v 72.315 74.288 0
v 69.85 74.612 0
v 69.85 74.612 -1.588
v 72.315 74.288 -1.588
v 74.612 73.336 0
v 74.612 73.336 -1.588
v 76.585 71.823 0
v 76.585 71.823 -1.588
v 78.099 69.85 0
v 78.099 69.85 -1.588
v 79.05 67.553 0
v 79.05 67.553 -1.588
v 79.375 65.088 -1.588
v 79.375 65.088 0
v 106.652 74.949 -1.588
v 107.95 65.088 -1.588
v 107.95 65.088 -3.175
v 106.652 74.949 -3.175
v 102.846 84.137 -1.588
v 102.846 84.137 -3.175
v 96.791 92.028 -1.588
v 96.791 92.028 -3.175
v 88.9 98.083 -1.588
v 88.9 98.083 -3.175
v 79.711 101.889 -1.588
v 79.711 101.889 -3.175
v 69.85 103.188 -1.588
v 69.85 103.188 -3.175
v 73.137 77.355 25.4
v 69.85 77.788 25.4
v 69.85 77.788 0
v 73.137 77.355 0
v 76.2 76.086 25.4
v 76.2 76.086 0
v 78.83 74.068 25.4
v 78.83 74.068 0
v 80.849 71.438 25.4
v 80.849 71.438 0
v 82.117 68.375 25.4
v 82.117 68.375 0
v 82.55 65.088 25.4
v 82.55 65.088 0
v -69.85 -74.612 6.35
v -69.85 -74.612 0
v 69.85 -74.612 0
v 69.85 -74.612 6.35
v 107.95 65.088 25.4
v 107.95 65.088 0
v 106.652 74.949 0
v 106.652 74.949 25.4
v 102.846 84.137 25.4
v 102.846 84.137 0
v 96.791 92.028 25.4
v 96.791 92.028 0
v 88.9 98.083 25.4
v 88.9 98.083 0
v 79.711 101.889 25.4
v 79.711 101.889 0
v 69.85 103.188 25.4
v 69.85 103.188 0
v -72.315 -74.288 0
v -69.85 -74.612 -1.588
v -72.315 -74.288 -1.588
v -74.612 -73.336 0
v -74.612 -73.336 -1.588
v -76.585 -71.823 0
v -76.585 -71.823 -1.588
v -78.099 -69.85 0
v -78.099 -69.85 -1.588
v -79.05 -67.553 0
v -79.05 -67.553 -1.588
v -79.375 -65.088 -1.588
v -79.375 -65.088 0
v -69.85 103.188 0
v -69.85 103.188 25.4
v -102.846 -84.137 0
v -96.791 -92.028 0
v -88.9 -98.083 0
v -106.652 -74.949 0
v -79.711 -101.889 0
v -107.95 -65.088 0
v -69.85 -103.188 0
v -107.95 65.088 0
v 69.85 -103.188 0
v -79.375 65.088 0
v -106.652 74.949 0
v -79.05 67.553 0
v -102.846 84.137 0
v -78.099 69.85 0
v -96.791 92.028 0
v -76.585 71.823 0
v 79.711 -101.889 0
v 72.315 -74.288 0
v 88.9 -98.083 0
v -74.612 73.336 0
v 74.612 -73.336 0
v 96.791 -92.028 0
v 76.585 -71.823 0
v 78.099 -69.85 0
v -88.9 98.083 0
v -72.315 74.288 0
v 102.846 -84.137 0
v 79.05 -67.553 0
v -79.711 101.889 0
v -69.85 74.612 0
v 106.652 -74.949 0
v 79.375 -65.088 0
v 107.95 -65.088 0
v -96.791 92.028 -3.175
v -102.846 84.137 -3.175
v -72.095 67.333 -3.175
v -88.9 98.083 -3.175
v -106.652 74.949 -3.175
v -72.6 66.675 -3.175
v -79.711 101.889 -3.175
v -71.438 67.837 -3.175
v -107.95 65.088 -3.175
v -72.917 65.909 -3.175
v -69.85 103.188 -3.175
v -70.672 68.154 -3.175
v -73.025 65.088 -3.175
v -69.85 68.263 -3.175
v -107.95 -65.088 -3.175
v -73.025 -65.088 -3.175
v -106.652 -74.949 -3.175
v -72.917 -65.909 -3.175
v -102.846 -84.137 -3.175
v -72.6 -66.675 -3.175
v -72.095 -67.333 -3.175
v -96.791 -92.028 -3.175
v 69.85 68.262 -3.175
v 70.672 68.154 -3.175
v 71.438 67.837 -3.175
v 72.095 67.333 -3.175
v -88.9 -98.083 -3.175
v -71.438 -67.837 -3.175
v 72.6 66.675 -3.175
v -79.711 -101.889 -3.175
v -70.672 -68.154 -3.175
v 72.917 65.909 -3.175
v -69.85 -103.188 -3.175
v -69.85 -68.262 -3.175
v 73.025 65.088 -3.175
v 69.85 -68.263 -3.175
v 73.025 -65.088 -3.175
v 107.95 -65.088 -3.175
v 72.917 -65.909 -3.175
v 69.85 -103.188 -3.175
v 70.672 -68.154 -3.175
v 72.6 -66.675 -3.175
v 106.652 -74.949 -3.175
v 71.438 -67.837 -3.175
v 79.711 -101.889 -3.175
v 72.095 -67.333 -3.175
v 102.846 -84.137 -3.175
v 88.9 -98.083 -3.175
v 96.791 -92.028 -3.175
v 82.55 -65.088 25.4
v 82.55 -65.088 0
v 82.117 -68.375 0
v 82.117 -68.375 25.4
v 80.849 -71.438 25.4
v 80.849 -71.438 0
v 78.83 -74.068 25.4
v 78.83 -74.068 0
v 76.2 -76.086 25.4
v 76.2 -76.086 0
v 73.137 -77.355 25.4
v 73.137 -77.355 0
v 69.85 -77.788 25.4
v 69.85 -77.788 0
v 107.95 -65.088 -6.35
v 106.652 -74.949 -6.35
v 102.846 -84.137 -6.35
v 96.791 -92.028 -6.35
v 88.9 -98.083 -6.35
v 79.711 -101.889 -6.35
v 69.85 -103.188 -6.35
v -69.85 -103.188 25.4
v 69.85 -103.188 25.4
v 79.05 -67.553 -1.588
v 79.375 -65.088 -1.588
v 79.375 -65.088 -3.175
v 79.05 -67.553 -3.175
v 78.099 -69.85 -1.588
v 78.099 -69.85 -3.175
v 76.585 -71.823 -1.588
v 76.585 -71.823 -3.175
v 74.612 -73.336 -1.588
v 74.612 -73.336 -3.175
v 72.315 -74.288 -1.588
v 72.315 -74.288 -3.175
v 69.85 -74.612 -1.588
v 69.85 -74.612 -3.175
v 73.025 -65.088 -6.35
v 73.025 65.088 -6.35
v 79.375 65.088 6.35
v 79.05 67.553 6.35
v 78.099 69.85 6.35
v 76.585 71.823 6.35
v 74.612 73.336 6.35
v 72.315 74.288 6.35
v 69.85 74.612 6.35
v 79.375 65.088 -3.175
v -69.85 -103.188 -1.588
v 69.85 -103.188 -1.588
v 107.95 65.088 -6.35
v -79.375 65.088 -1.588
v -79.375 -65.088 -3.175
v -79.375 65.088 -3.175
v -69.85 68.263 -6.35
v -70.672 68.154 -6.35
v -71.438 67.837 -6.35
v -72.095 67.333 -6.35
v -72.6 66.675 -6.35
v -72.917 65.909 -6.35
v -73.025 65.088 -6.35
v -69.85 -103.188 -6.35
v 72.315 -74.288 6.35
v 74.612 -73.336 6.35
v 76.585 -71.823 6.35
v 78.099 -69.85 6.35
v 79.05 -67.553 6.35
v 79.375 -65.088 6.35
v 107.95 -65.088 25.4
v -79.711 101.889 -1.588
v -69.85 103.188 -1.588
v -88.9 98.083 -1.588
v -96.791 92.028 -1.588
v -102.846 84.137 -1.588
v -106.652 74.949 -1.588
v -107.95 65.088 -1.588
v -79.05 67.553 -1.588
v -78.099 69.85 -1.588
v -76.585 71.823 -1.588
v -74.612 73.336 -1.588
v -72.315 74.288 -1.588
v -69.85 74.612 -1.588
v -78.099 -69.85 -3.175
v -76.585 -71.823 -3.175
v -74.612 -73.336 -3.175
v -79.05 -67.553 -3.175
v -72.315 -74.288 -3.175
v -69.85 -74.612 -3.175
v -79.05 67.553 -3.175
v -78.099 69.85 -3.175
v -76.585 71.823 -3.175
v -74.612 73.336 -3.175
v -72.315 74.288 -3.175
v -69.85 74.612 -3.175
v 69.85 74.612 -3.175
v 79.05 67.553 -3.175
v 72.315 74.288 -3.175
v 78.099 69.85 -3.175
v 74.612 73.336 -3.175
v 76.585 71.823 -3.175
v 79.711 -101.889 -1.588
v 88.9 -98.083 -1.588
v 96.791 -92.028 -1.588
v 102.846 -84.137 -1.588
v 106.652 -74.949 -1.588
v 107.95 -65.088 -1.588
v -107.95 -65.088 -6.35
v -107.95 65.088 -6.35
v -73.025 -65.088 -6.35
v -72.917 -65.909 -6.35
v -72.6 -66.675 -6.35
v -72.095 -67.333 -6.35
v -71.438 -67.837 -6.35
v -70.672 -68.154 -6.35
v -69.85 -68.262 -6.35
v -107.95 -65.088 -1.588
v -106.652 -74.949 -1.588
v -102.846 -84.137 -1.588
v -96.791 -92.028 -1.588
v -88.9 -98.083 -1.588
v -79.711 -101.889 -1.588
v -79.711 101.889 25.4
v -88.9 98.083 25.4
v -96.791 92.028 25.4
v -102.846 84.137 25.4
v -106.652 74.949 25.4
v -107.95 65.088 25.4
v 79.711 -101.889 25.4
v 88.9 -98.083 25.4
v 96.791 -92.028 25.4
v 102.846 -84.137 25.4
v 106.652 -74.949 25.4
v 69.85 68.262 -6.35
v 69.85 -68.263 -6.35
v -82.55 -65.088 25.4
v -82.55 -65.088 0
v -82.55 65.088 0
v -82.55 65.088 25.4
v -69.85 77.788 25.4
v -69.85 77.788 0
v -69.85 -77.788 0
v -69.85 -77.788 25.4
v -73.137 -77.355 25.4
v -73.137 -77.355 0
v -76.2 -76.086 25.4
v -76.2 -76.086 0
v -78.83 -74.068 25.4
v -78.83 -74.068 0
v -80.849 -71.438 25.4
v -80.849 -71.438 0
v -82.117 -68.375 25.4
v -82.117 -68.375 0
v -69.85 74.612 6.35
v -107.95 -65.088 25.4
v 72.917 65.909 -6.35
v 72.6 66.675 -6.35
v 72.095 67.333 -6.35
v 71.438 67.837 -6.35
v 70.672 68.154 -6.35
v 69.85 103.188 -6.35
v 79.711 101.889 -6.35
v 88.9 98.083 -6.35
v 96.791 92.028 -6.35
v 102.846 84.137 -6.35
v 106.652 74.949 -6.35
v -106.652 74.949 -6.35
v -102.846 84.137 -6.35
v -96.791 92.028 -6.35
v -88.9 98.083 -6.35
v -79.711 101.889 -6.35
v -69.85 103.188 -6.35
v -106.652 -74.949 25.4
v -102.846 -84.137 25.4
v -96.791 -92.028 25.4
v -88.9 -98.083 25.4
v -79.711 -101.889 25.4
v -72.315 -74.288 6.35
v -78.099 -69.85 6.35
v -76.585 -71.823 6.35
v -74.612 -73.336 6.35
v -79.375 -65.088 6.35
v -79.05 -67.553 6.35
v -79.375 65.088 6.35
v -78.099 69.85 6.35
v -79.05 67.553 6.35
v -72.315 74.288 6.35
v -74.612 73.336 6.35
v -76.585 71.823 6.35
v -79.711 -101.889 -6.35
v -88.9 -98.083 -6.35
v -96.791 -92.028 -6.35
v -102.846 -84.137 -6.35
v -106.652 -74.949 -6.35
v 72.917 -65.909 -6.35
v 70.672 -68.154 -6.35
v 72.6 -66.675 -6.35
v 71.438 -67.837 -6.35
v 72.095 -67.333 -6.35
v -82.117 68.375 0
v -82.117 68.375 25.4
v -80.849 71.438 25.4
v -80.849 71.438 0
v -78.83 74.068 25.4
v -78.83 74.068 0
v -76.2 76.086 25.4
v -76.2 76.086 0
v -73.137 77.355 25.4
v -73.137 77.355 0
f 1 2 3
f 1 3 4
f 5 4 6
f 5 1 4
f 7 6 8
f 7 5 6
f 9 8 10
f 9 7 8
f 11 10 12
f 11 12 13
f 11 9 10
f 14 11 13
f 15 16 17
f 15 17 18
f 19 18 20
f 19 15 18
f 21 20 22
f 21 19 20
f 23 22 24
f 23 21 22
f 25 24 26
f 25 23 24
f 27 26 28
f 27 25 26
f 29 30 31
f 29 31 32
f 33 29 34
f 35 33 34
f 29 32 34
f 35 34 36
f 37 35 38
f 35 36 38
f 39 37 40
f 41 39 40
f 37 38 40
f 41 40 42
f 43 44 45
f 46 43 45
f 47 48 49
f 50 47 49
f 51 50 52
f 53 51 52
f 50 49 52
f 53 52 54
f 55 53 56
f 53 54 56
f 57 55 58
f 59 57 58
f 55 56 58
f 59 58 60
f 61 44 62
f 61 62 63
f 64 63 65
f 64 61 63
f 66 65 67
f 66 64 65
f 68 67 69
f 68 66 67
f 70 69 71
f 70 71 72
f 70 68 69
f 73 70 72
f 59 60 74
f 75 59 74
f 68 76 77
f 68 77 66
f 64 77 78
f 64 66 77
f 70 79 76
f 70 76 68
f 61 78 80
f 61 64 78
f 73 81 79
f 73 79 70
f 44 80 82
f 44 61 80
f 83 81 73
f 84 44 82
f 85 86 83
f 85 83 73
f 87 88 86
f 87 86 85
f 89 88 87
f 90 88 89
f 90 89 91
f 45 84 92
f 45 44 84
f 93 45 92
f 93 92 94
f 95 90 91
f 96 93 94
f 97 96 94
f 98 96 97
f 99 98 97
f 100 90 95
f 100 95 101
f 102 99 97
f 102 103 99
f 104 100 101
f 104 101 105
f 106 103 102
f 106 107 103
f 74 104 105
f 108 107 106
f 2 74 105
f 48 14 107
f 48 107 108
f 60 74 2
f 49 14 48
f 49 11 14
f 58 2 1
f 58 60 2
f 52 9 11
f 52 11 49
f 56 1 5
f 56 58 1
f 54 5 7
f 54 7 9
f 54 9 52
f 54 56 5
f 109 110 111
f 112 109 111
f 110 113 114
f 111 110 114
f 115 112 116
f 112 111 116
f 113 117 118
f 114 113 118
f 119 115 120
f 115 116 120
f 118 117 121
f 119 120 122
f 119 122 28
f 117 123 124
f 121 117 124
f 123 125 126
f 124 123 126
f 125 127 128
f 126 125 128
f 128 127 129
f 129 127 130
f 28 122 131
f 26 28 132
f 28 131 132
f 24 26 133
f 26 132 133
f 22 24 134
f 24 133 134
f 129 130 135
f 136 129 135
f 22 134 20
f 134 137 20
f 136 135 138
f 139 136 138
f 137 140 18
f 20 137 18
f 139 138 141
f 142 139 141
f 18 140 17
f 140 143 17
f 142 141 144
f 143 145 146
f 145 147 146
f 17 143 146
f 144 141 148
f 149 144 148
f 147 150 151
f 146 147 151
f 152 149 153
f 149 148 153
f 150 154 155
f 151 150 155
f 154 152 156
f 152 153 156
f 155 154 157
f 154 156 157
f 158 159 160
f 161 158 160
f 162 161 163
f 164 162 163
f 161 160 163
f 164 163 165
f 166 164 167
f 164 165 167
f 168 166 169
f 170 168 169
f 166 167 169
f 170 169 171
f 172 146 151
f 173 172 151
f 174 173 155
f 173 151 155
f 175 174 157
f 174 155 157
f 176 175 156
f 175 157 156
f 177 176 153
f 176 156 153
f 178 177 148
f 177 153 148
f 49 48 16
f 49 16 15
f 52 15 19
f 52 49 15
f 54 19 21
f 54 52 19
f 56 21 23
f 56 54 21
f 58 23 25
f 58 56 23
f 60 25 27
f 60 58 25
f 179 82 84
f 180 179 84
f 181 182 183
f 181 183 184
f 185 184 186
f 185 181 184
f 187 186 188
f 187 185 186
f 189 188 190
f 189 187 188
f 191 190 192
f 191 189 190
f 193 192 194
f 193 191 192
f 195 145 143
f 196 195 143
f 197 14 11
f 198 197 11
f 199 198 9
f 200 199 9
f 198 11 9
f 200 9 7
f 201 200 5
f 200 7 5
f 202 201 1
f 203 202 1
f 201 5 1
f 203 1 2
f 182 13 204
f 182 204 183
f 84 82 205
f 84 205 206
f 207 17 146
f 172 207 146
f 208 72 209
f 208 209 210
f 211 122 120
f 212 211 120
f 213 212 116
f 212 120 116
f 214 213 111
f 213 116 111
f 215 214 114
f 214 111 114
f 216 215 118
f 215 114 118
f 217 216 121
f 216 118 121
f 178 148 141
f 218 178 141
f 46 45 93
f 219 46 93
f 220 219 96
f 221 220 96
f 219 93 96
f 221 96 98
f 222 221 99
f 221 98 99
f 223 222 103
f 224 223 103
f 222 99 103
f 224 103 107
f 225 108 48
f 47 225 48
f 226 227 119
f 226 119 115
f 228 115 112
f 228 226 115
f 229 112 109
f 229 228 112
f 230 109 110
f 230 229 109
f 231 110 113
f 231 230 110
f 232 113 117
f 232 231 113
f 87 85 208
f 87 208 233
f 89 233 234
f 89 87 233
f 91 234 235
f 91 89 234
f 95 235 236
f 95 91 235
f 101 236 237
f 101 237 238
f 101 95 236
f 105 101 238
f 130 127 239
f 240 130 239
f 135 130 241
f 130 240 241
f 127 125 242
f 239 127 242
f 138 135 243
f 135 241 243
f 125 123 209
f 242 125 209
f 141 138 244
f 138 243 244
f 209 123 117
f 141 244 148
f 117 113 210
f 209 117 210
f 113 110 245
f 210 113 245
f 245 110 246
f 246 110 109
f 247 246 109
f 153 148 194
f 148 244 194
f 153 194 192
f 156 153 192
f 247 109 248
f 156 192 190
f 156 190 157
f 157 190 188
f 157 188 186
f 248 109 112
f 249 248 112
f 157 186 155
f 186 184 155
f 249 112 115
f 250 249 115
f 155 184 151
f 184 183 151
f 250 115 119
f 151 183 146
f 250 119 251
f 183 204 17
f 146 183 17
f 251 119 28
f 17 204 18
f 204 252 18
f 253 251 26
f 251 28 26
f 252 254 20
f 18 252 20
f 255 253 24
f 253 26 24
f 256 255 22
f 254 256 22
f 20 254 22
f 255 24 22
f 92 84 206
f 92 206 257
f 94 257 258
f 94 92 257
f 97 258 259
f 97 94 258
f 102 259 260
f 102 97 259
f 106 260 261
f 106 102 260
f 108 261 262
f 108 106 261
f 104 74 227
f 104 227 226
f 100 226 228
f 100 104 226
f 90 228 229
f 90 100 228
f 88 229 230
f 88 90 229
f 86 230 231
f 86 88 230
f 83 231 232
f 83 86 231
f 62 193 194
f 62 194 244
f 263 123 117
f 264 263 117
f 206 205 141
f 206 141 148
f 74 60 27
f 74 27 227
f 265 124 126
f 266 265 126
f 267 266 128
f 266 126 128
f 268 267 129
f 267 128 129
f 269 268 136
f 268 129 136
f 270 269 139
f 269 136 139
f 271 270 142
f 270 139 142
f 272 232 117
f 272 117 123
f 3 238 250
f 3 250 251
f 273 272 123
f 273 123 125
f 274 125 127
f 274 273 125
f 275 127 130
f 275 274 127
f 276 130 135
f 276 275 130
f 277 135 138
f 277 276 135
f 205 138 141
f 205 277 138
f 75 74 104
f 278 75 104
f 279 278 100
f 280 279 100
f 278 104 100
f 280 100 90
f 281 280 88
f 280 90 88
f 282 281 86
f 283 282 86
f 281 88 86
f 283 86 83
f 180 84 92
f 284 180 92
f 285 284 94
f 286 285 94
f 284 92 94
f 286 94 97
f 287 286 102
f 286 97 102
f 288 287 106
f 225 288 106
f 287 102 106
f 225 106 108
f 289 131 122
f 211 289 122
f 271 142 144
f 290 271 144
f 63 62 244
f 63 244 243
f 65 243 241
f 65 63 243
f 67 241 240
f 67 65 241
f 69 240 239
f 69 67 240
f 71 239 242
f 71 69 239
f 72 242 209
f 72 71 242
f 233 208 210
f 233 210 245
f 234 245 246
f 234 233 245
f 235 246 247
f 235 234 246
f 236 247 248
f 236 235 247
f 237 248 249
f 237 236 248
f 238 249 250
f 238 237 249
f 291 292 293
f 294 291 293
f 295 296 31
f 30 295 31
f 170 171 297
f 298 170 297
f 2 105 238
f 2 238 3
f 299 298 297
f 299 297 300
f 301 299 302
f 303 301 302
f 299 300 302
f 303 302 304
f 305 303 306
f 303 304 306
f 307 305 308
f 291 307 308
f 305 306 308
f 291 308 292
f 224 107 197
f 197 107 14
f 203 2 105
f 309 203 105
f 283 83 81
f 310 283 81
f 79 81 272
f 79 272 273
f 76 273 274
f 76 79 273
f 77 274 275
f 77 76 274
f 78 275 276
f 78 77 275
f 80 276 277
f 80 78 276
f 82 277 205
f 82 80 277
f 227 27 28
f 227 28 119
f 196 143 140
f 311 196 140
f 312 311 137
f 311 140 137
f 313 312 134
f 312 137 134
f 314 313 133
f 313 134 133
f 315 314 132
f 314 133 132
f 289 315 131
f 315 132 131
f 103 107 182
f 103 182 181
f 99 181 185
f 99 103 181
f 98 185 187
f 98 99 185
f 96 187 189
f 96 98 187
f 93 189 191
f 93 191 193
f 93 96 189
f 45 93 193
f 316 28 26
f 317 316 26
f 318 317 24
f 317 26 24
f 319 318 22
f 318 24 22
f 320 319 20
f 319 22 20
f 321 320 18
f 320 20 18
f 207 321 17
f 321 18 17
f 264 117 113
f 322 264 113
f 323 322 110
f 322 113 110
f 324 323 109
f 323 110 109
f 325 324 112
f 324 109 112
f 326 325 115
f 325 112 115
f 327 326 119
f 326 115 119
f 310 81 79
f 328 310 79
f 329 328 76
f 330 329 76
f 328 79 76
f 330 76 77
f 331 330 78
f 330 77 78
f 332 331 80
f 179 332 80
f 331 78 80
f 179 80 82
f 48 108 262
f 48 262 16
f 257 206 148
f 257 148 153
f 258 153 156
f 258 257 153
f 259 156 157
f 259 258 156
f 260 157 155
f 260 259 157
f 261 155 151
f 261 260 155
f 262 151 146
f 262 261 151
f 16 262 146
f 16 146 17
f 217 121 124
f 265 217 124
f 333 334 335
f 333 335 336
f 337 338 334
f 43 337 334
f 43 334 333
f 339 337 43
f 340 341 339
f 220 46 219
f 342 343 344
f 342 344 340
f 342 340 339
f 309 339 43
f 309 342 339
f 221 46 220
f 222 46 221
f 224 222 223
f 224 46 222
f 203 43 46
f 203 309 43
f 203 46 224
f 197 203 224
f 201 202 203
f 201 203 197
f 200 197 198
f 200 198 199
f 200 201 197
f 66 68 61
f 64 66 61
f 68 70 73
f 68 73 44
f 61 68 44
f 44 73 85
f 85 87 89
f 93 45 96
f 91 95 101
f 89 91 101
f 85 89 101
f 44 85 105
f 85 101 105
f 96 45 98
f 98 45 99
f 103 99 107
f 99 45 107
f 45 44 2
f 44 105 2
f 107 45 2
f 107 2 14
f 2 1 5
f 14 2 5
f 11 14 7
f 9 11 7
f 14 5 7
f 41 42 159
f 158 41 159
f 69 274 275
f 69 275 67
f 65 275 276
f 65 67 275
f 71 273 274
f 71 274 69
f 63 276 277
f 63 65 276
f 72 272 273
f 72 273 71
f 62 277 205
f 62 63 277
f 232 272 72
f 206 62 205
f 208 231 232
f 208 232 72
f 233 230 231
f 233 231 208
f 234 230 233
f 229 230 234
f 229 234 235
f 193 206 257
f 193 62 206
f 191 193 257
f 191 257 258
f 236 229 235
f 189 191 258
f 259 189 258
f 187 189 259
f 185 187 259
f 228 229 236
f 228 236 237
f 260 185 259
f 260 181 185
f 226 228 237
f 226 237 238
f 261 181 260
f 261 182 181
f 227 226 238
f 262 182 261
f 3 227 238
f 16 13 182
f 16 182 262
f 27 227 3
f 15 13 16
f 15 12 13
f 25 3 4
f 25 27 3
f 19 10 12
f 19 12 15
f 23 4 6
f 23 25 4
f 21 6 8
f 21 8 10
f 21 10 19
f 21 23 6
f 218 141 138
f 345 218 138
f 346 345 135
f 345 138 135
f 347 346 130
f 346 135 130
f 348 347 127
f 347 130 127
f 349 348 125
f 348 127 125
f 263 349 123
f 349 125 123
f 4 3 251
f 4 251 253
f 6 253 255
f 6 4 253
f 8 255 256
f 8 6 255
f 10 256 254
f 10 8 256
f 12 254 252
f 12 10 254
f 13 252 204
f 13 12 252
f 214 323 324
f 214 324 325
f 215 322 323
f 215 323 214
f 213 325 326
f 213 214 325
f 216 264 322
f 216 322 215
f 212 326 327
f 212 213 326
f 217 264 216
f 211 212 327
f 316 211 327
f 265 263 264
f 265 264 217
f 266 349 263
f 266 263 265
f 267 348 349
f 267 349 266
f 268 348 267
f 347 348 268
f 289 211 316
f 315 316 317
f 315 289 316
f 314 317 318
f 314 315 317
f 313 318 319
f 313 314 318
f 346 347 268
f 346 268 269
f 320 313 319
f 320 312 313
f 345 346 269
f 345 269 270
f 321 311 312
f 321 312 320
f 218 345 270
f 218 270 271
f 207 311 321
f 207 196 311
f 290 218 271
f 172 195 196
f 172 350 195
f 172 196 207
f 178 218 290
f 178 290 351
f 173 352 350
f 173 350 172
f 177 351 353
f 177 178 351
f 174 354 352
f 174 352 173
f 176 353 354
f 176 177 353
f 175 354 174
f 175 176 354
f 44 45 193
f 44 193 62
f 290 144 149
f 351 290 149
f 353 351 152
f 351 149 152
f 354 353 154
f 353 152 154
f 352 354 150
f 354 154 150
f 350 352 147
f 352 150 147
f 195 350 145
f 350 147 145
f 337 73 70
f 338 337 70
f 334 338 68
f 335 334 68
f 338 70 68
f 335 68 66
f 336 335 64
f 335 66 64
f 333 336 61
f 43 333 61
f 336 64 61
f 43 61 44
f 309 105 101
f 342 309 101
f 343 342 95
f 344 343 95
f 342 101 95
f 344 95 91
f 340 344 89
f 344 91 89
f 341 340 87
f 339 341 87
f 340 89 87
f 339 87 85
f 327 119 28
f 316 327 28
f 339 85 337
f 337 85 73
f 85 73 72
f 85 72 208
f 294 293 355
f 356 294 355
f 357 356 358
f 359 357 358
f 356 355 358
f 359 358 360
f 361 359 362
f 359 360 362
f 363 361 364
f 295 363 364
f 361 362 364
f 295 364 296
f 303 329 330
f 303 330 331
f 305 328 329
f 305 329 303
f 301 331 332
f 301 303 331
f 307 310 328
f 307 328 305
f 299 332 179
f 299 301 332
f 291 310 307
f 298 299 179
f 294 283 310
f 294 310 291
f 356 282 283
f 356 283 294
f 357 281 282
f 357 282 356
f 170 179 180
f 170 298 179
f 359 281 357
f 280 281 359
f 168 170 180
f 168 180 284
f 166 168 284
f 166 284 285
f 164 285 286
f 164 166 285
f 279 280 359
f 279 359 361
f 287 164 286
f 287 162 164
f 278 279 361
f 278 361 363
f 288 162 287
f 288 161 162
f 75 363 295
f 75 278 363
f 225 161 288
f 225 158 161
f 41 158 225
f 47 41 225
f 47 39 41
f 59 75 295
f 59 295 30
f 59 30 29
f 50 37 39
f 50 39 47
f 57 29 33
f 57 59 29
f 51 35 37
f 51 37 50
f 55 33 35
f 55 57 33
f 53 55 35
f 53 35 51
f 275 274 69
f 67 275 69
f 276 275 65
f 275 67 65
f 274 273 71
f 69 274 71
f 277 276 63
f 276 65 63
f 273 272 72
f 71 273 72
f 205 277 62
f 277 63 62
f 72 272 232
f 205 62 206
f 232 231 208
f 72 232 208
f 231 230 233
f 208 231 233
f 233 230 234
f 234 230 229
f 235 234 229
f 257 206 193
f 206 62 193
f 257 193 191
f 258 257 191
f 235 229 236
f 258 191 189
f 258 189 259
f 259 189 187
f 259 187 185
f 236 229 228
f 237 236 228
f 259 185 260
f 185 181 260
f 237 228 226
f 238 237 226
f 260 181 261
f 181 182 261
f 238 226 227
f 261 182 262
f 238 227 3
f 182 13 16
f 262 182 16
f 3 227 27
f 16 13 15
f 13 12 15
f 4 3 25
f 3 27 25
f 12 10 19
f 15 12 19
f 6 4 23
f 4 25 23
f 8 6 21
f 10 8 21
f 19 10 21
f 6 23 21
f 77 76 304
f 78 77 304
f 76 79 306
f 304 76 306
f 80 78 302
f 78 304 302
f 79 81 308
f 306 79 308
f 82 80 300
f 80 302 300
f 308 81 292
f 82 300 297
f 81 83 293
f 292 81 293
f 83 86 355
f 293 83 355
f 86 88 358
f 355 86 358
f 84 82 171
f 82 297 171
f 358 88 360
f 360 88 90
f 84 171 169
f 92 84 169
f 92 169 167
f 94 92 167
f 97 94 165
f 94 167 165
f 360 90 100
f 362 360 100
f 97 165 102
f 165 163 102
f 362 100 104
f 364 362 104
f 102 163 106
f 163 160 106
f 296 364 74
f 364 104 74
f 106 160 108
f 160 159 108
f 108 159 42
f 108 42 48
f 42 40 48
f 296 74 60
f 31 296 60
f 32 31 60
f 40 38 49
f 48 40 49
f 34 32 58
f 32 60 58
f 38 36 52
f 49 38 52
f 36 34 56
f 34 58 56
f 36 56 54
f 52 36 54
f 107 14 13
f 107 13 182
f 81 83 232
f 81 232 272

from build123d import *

# Parameters (mm, degrees)
F1_DEPTH = 25.4
F2_DEPTH = 6.35
F3_DEPTH = 1.5875
F4_DEPTH = 1.5875
F6_DEPTH = 3.175


with BuildPart() as f1:
    # F0 (on Top) → F1 (new body)
    with BuildSketch(Plane.XY):
        with BuildLine():
            ThreePointArc((-69.85, 103.1875), (-96.7907683632, 92.0282683632), (-107.95, 65.0875))
            Line((-107.95, 65.0875), (-107.95, -65.0875))
            ThreePointArc((-107.95, -65.0875), (-96.7907683632, -92.0282683632), (-69.85, -103.1875))
            Line((-69.85, -103.1875), (69.85, -103.1875))
            ThreePointArc((69.85, -103.1875), (96.7907683632, -92.0282683632), (107.95, -65.0875))
            Line((107.95, -65.0875), (107.95, 65.0875))
            ThreePointArc((107.95, 65.0875), (96.7907683632, 92.0282683632), (69.85, 103.1875))
            Line((69.85, 103.1875), (-69.85, 103.1875))
        make_face()
        with BuildLine():
            Line((-69.85, 77.7875), (69.85, 77.7875))
            ThreePointArc((69.85, 77.7875), (78.8302561211, 74.0677561211), (82.55, 65.0875))
            Line((82.55, 65.0875), (82.55, -65.0875))
            ThreePointArc((82.55, -65.0875), (78.8302561211, -74.0677561211), (69.85, -77.7875))
            Line((69.85, -77.7875), (-69.85, -77.7875))
            ThreePointArc((-69.85, -77.7875), (-78.8302561211, -74.0677561211), (-82.55, -65.0875))
            Line((-82.55, -65.0875), (-82.55, 65.0875))
            ThreePointArc((-82.55, 65.0875), (-78.8302561211, 74.0677561211), (-69.85, 77.7875))
        make_face(mode=Mode.SUBTRACT)
    extrude(amount=F1_DEPTH)


with BuildPart() as f2:
    # F0 (on Top) → F2 (new body)
    with BuildSketch(Plane.XY):
        with BuildLine():
            Line((79.375, -65.0875), (79.375, 65.0875))
            ThreePointArc((79.375, 65.0875), (76.5851920908, 71.8226920908), (69.85, 74.6125))
            Line((69.85, 74.6125), (-69.85, 74.6125))
            ThreePointArc((-69.85, 74.6125), (-76.5851920908, 71.8226920908), (-79.375, 65.0875))
            Line((-79.375, 65.0875), (-79.375, -65.0875))
            ThreePointArc((-79.375, -65.0875), (-76.5851920908, -71.8226920908), (-69.85, -74.6125))
            Line((-69.85, -74.6125), (69.85, -74.6125))
            ThreePointArc((69.85, -74.6125), (76.5851920908, -71.8226920908), (79.375, -65.0875))
        make_face()
        with BuildLine():
            ThreePointArc((73.025, -65.0875), (72.0950640303, -67.3325640303), (69.85, -68.2625))
            Line((69.85, -68.2625), (-69.85, -68.2625))
            ThreePointArc((-69.85, -68.2625), (-72.0950640303, -67.3325640303), (-73.025, -65.0875))
            Line((-73.025, -65.0875), (-73.025, 65.0875))
            ThreePointArc((-73.025, 65.0875), (-72.0950640303, 67.3325640303), (-69.85, 68.2625))
            Line((-69.85, 68.2625), (69.85, 68.2625))
            ThreePointArc((69.85, 68.2625), (72.0950640303, 67.3325640303), (73.025, 65.0875))
            Line((73.025, 65.0875), (73.025, -65.0875))
        make_face(mode=Mode.SUBTRACT)
        with BuildLine():
            Line((-69.85, -68.2625), (69.85, -68.2625))
            ThreePointArc((69.85, -68.2625), (72.0950640303, -67.3325640303), (73.025, -65.0875))
            Line((73.025, -65.0875), (73.025, 65.0875))
            ThreePointArc((73.025, 65.0875), (72.0950640303, 67.3325640303), (69.85, 68.2625))
            Line((69.85, 68.2625), (-69.85, 68.2625))
            ThreePointArc((-69.85, 68.2625), (-72.0950640303, 67.3325640303), (-73.025, 65.0875))
            Line((-73.025, 65.0875), (-73.025, -65.0875))
            ThreePointArc((-73.025, -65.0875), (-72.0950640303, -67.3325640303), (-69.85, -68.2625))
        make_face()
    extrude(amount=F2_DEPTH)


with BuildPart() as f3:
    # F0 (on Top) → F3 (new body)
    with BuildSketch(Plane.XY):
        with BuildLine():
            ThreePointArc((-69.85, 103.1875), (-96.7907683632, 92.0282683632), (-107.95, 65.0875))
            Line((-107.95, 65.0875), (-107.95, -65.0875))
            ThreePointArc((-107.95, -65.0875), (-96.7907683632, -92.0282683632), (-69.85, -103.1875))
            Line((-69.85, -103.1875), (69.85, -103.1875))
            ThreePointArc((69.85, -103.1875), (96.7907683632, -92.0282683632), (107.95, -65.0875))
            Line((107.95, -65.0875), (107.95, 65.0875))
            ThreePointArc((107.95, 65.0875), (96.7907683632, 92.0282683632), (69.85, 103.1875))
            Line((69.85, 103.1875), (-69.85, 103.1875))
        make_face()
        with BuildLine():
            Line((-69.85, 77.7875), (69.85, 77.7875))
            ThreePointArc((69.85, 77.7875), (78.8302561211, 74.0677561211), (82.55, 65.0875))
            Line((82.55, 65.0875), (82.55, -65.0875))
            ThreePointArc((82.55, -65.0875), (78.8302561211, -74.0677561211), (69.85, -77.7875))
            Line((69.85, -77.7875), (-69.85, -77.7875))
            ThreePointArc((-69.85, -77.7875), (-78.8302561211, -74.0677561211), (-82.55, -65.0875))
            Line((-82.55, -65.0875), (-82.55, 65.0875))
            ThreePointArc((-82.55, 65.0875), (-78.8302561211, 74.0677561211), (-69.85, 77.7875))
        make_face(mode=Mode.SUBTRACT)
        with BuildLine():
            ThreePointArc((82.55, 65.0875), (78.8302561211, 74.0677561211), (69.85, 77.7875))
            Line((69.85, 77.7875), (-69.85, 77.7875))
            ThreePointArc((-69.85, 77.7875), (-78.8302561211, 74.0677561211), (-82.55, 65.0875))
            Line((-82.55, 65.0875), (-82.55, -65.0875))
            ThreePointArc((-82.55, -65.0875), (-78.8302561211, -74.0677561211), (-69.85, -77.7875))
            Line((-69.85, -77.7875), (69.85, -77.7875))
            ThreePointArc((69.85, -77.7875), (78.8302561211, -74.0677561211), (82.55, -65.0875))
            Line((82.55, -65.0875), (82.55, 65.0875))
        make_face()
        with BuildLine():
            ThreePointArc((69.85, 74.6125), (76.5851920908, 71.8226920908), (79.375, 65.0875))
            Line((79.375, 65.0875), (79.375, -65.0875))
            ThreePointArc((79.375, -65.0875), (76.5851920908, -71.8226920908), (69.85, -74.6125))
            Line((69.85, -74.6125), (-69.85, -74.6125))
            ThreePointArc((-69.85, -74.6125), (-76.5851920908, -71.8226920908), (-79.375, -65.0875))
            Line((-79.375, -65.0875), (-79.375, 65.0875))
            ThreePointArc((-79.375, 65.0875), (-76.5851920908, 71.8226920908), (-69.85, 74.6125))
            Line((-69.85, 74.6125), (69.85, 74.6125))
        make_face(mode=Mode.SUBTRACT)
    extrude(amount=-F3_DEPTH)


with BuildPart() as f4:
    # F4 (new): a face of the model
    f4_faces = [f3.part.faces().sort_by_distance(p)[0] for p in [
        (94.6788563075, 89.9163563075, -1.5875),
    ]]
    extrude(f4_faces, amount=F4_DEPTH)


with BuildPart() as f6:
    # F5 (on face) → F6 (new body)
    with BuildSketch(Plane(origin=(0, 0, -3.175), x_dir=(1, 0, 0), z_dir=(0, 0, -1))):
        with BuildLine():
            ThreePointArc((-69.85, 103.1875), (-96.7907683632, 92.0282683632), (-107.95, 65.0875))
            Line((-107.95, 65.0875), (-107.95, -65.0875))
            ThreePointArc((-107.95, -65.0875), (-96.7907683632, -92.0282683632), (-69.85, -103.1875))
            Line((-69.85, -103.1875), (69.85, -103.1875))
            ThreePointArc((69.85, -103.1875), (96.7907683632, -92.0282683632), (107.95, -65.0875))
            Line((107.95, -65.0875), (107.95, 65.0875))
            ThreePointArc((107.95, 65.0875), (96.7907683632, 92.0282683632), (69.85, 103.1875))
            Line((69.85, 103.1875), (-69.85, 103.1875))
        make_face()
        with BuildLine():
            Line((-69.85, 77.7875), (69.85, 77.7875))
            ThreePointArc((69.85, 77.7875), (78.8302561211, 74.0677561211), (82.55, 65.0875))
            Line((82.55, 65.0875), (82.55, -65.0875))
            ThreePointArc((82.55, -65.0875), (78.8302561211, -74.0677561211), (69.85, -77.7875))
            Line((69.85, -77.7875), (-69.85, -77.7875))
            ThreePointArc((-69.85, -77.7875), (-78.8302561211, -74.0677561211), (-82.55, -65.0875))
            Line((-82.55, -65.0875), (-82.55, 65.0875))
            ThreePointArc((-82.55, 65.0875), (-78.8302561211, 74.0677561211), (-69.85, 77.7875))
        make_face(mode=Mode.SUBTRACT)
        with BuildLine():
            ThreePointArc((82.55, 65.0875), (78.8302561211, 74.0677561211), (69.85, 77.7875))
            Line((69.85, 77.7875), (-69.85, 77.7875))
            ThreePointArc((-69.85, 77.7875), (-78.8302561211, 74.0677561211), (-82.55, 65.0875))
            Line((-82.55, 65.0875), (-82.55, -65.0875))
            ThreePointArc((-82.55, -65.0875), (-78.8302561211, -74.0677561211), (-69.85, -77.7875))
            Line((-69.85, -77.7875), (69.85, -77.7875))
            ThreePointArc((69.85, -77.7875), (78.8302561211, -74.0677561211), (82.55, -65.0875))
            Line((82.55, -65.0875), (82.55, 65.0875))
        make_face()
        with BuildLine():
            ThreePointArc((69.85, 74.6125), (76.5851920908, 71.8226920908), (79.375, 65.0875))
            Line((79.375, 65.0875), (79.375, -65.0875))
            ThreePointArc((79.375, -65.0875), (76.5851920908, -71.8226920908), (69.85, -74.6125))
            Line((69.85, -74.6125), (-69.85, -74.6125))
            ThreePointArc((-69.85, -74.6125), (-76.5851920908, -71.8226920908), (-79.375, -65.0875))
            Line((-79.375, -65.0875), (-79.375, 65.0875))
            ThreePointArc((-79.375, 65.0875), (-76.5851920908, 71.8226920908), (-69.85, 74.6125))
            Line((-69.85, 74.6125), (69.85, 74.6125))
        make_face(mode=Mode.SUBTRACT)
        with BuildLine():
            Line((79.375, -65.0875), (79.375, 65.0875))
            ThreePointArc((79.375, 65.0875), (76.5851920908, 71.8226920908), (69.85, 74.6125))
            Line((69.85, 74.6125), (-69.85, 74.6125))
            ThreePointArc((-69.85, 74.6125), (-76.5851920908, 71.8226920908), (-79.375, 65.0875))
            Line((-79.375, 65.0875), (-79.375, -65.0875))
            ThreePointArc((-79.375, -65.0875), (-76.5851920908, -71.8226920908), (-69.85, -74.6125))
            Line((-69.85, -74.6125), (69.85, -74.6125))
            ThreePointArc((69.85, -74.6125), (76.5851920908, -71.8226920908), (79.375, -65.0875))
        make_face()
        with BuildLine():
            ThreePointArc((73.025, -65.0875), (72.0950640303, -67.3325640303), (69.85, -68.2625))
            Line((69.85, -68.2625), (-69.85, -68.2625))
            ThreePointArc((-69.85, -68.2625), (-72.0950640303, -67.3325640303), (-73.025, -65.0875))
            Line((-73.025, -65.0875), (-73.025, 65.0875))
            ThreePointArc((-73.025, 65.0875), (-72.0950640303, 67.3325640303), (-69.85, 68.2625))
            Line((-69.85, 68.2625), (69.85, 68.2625))
            ThreePointArc((69.85, 68.2625), (72.0950640303, 67.3325640303), (73.025, 65.0875))
            Line((73.025, 65.0875), (73.025, -65.0875))
        make_face(mode=Mode.SUBTRACT)
    extrude(amount=F6_DEPTH)


solid = Compound([f1.part, f2.part, f3.part, f4.part, f6.part])
